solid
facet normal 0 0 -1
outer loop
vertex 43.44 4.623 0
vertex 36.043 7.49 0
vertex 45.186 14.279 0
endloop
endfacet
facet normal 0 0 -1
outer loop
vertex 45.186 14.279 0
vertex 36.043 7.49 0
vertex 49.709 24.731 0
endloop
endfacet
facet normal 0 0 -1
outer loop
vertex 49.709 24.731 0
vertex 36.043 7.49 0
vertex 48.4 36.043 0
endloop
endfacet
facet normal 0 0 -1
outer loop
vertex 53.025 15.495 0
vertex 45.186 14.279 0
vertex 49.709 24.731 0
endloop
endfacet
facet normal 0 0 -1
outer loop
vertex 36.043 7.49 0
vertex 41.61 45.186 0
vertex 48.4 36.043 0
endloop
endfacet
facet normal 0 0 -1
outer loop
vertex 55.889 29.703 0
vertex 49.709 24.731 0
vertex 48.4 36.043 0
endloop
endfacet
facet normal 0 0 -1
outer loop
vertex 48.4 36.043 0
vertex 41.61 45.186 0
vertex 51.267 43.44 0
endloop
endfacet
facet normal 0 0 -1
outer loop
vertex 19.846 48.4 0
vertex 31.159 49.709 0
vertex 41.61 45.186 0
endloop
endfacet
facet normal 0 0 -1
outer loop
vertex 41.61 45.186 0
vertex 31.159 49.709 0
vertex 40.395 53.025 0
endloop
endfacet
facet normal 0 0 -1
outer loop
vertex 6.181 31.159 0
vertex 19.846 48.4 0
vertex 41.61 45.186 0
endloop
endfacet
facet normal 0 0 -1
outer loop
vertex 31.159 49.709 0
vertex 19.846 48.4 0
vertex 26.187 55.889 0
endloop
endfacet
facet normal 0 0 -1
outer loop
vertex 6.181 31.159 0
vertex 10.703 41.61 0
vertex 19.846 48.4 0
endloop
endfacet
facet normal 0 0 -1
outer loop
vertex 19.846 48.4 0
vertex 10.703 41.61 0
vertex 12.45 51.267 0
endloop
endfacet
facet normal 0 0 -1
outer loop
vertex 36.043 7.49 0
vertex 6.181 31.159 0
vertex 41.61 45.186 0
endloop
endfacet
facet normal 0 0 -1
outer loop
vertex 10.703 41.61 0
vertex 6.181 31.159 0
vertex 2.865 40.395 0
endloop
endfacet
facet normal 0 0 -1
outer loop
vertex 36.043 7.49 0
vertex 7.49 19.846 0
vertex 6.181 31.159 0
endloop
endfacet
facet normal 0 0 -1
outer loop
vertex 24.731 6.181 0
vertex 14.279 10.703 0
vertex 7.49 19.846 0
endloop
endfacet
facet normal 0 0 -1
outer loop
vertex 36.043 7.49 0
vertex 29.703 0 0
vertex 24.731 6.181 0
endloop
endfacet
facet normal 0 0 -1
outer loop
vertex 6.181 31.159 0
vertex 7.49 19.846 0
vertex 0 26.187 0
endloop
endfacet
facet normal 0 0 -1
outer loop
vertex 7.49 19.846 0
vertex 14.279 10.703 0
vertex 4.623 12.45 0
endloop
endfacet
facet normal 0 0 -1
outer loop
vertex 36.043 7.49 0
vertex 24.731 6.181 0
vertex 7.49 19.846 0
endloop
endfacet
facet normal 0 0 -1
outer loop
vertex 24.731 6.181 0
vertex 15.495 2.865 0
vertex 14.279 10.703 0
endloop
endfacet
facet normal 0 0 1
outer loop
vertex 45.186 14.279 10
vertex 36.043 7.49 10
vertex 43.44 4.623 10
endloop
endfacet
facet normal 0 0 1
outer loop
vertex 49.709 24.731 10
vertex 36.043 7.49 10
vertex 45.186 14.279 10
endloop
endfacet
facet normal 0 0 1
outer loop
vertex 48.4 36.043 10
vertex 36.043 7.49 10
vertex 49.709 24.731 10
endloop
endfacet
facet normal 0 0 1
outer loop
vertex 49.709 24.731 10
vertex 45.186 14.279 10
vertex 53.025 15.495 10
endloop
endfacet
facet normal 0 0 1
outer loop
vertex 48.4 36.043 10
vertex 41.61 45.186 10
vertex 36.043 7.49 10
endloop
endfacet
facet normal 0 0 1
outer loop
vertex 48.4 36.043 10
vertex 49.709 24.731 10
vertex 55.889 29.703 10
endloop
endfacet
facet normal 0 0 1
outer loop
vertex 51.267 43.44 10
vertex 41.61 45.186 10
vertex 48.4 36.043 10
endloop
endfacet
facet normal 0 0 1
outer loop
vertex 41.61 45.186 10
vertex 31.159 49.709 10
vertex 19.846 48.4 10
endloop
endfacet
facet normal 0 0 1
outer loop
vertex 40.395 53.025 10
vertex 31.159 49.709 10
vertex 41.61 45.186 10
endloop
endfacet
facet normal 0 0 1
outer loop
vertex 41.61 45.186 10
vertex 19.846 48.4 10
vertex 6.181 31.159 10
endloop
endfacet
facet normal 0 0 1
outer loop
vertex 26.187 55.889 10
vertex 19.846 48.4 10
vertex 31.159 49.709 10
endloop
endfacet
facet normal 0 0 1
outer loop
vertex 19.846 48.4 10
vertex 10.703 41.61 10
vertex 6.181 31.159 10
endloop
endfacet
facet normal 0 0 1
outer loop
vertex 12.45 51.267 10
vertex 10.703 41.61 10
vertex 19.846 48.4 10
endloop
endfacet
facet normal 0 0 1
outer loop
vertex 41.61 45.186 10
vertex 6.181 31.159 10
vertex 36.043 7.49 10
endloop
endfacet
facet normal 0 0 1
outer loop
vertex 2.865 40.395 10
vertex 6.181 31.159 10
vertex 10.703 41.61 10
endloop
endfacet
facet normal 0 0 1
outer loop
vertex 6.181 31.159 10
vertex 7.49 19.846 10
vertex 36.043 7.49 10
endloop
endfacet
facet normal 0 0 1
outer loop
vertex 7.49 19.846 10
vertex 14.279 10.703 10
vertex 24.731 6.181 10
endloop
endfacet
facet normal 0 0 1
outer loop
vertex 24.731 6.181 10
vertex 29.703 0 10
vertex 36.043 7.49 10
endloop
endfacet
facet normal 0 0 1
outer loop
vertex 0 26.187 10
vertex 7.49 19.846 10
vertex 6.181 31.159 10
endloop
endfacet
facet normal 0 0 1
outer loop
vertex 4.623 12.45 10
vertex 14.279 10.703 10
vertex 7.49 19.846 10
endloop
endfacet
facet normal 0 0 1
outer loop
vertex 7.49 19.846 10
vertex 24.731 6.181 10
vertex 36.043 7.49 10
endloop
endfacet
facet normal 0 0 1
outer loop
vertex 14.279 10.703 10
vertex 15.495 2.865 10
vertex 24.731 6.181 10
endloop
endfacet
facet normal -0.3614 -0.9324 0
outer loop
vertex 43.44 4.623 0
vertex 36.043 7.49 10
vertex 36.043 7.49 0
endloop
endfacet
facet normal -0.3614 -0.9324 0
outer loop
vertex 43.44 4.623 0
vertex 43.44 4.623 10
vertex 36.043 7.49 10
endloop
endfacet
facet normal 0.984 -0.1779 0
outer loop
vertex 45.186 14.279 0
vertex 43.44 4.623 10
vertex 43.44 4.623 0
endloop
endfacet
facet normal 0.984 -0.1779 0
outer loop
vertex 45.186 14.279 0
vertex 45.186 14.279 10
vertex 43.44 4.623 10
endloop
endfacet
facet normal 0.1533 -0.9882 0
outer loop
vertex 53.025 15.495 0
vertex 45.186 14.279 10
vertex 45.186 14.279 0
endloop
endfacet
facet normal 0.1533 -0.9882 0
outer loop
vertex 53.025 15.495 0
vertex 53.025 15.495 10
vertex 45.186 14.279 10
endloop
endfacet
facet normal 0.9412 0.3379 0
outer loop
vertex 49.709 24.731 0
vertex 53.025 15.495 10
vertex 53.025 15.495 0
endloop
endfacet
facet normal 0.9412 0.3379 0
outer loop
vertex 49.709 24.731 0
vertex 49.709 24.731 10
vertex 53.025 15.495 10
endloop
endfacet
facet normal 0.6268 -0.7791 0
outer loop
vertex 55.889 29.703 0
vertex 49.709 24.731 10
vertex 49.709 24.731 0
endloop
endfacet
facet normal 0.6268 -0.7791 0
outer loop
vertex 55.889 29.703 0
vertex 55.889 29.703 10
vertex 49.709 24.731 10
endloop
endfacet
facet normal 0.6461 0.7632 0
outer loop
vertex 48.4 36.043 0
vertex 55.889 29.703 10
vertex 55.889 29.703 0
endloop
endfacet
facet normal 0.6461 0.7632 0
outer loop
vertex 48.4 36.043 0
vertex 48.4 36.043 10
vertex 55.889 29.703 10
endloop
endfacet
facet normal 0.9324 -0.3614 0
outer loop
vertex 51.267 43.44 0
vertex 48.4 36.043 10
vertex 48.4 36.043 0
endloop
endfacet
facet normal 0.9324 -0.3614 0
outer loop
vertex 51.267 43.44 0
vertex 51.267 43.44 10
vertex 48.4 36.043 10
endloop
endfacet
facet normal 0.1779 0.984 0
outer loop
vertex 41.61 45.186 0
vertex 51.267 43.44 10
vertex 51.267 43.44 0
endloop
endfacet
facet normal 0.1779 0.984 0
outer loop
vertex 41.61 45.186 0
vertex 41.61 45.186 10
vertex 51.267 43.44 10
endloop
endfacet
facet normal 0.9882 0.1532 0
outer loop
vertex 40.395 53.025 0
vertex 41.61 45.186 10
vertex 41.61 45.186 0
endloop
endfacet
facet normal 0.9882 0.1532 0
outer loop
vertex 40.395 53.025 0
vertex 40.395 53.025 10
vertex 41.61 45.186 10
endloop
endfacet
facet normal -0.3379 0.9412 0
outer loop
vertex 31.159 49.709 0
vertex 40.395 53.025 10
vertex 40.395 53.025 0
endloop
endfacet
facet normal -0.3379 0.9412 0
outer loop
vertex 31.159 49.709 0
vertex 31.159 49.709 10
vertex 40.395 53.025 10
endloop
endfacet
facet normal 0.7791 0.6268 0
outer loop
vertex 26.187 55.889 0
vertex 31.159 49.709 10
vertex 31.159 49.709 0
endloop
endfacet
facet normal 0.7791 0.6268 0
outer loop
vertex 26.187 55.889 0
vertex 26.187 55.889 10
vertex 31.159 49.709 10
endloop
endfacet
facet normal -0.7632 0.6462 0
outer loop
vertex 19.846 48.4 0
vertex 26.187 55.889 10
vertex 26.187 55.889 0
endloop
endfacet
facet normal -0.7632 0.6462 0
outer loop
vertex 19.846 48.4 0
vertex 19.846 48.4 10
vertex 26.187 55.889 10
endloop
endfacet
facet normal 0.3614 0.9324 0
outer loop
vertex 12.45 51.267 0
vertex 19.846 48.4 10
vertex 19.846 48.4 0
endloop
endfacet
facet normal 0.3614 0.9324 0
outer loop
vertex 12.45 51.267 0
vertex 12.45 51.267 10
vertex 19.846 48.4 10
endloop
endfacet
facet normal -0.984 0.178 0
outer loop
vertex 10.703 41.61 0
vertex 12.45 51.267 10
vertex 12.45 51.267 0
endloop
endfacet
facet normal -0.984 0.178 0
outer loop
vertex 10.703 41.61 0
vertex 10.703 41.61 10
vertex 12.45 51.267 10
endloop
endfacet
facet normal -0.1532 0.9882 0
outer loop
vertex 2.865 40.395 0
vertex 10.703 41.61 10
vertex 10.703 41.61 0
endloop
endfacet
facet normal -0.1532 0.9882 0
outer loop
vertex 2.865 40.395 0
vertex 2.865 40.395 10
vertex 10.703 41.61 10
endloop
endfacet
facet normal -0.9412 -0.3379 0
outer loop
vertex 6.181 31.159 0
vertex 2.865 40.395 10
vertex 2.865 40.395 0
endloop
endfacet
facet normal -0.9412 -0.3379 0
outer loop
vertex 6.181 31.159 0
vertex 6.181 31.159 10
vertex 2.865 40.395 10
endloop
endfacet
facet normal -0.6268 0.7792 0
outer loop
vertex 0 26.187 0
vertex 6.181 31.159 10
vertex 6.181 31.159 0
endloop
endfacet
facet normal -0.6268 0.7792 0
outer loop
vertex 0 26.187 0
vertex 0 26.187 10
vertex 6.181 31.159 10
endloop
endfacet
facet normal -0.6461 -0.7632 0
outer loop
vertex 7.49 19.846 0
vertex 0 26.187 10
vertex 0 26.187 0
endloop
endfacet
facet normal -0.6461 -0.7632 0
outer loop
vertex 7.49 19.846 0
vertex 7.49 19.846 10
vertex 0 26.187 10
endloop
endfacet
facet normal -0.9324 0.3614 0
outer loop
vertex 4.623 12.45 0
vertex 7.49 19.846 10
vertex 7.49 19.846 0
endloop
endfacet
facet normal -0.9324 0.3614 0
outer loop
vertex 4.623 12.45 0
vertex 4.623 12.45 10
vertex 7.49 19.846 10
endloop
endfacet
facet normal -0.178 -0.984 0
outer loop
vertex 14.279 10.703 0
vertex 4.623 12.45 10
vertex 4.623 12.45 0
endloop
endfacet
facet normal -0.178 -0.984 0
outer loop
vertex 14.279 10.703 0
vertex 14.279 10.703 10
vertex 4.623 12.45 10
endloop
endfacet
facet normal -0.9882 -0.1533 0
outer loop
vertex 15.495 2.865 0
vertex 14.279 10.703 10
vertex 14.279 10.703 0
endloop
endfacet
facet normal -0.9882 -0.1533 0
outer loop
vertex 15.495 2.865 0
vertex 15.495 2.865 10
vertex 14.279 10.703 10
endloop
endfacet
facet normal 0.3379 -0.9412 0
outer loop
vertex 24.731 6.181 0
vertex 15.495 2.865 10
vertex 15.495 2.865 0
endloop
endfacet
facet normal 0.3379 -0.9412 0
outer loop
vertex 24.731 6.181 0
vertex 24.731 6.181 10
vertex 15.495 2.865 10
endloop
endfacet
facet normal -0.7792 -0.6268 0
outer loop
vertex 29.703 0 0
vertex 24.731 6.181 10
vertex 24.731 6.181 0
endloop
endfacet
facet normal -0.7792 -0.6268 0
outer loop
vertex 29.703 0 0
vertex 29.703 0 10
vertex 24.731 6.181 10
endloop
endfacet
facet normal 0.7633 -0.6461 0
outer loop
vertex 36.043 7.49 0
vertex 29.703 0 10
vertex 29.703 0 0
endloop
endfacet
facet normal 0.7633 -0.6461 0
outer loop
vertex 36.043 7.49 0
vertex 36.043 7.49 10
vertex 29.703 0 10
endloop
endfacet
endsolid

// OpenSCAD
$fn = 32;

// ----------------------------------------------------------------------
// Chain sprocket: 12 teeth, 22 mm root radius
// ----------------------------------------------------------------------

// --- parameters (mm) ---
profile_height = 10;      // extrusion height
profile_points = 24;      // points of the closed outline

profile = [[49.709, 24.731], [55.889, 29.703], [48.4, 36.043], [51.267, 43.44], [41.61, 45.186], [40.395, 53.025], [31.159, 49.709], [26.187, 55.889], [19.846, 48.4], [12.45, 51.267], [10.703, 41.61], [2.865, 40.395], [6.181, 31.159], [0, 26.187], [7.49, 19.846], [4.623, 12.45], [14.279, 10.703], [15.495, 2.865], [24.731, 6.181], [29.703, 0], [36.043, 7.49], [43.44, 4.623], [45.186, 14.279], [53.025, 15.495]];  // single closed polygon, 24 points, counter clockwise

// --- the one profile operation ---
linear_extrude(height = profile_height) polygon(points = profile);
